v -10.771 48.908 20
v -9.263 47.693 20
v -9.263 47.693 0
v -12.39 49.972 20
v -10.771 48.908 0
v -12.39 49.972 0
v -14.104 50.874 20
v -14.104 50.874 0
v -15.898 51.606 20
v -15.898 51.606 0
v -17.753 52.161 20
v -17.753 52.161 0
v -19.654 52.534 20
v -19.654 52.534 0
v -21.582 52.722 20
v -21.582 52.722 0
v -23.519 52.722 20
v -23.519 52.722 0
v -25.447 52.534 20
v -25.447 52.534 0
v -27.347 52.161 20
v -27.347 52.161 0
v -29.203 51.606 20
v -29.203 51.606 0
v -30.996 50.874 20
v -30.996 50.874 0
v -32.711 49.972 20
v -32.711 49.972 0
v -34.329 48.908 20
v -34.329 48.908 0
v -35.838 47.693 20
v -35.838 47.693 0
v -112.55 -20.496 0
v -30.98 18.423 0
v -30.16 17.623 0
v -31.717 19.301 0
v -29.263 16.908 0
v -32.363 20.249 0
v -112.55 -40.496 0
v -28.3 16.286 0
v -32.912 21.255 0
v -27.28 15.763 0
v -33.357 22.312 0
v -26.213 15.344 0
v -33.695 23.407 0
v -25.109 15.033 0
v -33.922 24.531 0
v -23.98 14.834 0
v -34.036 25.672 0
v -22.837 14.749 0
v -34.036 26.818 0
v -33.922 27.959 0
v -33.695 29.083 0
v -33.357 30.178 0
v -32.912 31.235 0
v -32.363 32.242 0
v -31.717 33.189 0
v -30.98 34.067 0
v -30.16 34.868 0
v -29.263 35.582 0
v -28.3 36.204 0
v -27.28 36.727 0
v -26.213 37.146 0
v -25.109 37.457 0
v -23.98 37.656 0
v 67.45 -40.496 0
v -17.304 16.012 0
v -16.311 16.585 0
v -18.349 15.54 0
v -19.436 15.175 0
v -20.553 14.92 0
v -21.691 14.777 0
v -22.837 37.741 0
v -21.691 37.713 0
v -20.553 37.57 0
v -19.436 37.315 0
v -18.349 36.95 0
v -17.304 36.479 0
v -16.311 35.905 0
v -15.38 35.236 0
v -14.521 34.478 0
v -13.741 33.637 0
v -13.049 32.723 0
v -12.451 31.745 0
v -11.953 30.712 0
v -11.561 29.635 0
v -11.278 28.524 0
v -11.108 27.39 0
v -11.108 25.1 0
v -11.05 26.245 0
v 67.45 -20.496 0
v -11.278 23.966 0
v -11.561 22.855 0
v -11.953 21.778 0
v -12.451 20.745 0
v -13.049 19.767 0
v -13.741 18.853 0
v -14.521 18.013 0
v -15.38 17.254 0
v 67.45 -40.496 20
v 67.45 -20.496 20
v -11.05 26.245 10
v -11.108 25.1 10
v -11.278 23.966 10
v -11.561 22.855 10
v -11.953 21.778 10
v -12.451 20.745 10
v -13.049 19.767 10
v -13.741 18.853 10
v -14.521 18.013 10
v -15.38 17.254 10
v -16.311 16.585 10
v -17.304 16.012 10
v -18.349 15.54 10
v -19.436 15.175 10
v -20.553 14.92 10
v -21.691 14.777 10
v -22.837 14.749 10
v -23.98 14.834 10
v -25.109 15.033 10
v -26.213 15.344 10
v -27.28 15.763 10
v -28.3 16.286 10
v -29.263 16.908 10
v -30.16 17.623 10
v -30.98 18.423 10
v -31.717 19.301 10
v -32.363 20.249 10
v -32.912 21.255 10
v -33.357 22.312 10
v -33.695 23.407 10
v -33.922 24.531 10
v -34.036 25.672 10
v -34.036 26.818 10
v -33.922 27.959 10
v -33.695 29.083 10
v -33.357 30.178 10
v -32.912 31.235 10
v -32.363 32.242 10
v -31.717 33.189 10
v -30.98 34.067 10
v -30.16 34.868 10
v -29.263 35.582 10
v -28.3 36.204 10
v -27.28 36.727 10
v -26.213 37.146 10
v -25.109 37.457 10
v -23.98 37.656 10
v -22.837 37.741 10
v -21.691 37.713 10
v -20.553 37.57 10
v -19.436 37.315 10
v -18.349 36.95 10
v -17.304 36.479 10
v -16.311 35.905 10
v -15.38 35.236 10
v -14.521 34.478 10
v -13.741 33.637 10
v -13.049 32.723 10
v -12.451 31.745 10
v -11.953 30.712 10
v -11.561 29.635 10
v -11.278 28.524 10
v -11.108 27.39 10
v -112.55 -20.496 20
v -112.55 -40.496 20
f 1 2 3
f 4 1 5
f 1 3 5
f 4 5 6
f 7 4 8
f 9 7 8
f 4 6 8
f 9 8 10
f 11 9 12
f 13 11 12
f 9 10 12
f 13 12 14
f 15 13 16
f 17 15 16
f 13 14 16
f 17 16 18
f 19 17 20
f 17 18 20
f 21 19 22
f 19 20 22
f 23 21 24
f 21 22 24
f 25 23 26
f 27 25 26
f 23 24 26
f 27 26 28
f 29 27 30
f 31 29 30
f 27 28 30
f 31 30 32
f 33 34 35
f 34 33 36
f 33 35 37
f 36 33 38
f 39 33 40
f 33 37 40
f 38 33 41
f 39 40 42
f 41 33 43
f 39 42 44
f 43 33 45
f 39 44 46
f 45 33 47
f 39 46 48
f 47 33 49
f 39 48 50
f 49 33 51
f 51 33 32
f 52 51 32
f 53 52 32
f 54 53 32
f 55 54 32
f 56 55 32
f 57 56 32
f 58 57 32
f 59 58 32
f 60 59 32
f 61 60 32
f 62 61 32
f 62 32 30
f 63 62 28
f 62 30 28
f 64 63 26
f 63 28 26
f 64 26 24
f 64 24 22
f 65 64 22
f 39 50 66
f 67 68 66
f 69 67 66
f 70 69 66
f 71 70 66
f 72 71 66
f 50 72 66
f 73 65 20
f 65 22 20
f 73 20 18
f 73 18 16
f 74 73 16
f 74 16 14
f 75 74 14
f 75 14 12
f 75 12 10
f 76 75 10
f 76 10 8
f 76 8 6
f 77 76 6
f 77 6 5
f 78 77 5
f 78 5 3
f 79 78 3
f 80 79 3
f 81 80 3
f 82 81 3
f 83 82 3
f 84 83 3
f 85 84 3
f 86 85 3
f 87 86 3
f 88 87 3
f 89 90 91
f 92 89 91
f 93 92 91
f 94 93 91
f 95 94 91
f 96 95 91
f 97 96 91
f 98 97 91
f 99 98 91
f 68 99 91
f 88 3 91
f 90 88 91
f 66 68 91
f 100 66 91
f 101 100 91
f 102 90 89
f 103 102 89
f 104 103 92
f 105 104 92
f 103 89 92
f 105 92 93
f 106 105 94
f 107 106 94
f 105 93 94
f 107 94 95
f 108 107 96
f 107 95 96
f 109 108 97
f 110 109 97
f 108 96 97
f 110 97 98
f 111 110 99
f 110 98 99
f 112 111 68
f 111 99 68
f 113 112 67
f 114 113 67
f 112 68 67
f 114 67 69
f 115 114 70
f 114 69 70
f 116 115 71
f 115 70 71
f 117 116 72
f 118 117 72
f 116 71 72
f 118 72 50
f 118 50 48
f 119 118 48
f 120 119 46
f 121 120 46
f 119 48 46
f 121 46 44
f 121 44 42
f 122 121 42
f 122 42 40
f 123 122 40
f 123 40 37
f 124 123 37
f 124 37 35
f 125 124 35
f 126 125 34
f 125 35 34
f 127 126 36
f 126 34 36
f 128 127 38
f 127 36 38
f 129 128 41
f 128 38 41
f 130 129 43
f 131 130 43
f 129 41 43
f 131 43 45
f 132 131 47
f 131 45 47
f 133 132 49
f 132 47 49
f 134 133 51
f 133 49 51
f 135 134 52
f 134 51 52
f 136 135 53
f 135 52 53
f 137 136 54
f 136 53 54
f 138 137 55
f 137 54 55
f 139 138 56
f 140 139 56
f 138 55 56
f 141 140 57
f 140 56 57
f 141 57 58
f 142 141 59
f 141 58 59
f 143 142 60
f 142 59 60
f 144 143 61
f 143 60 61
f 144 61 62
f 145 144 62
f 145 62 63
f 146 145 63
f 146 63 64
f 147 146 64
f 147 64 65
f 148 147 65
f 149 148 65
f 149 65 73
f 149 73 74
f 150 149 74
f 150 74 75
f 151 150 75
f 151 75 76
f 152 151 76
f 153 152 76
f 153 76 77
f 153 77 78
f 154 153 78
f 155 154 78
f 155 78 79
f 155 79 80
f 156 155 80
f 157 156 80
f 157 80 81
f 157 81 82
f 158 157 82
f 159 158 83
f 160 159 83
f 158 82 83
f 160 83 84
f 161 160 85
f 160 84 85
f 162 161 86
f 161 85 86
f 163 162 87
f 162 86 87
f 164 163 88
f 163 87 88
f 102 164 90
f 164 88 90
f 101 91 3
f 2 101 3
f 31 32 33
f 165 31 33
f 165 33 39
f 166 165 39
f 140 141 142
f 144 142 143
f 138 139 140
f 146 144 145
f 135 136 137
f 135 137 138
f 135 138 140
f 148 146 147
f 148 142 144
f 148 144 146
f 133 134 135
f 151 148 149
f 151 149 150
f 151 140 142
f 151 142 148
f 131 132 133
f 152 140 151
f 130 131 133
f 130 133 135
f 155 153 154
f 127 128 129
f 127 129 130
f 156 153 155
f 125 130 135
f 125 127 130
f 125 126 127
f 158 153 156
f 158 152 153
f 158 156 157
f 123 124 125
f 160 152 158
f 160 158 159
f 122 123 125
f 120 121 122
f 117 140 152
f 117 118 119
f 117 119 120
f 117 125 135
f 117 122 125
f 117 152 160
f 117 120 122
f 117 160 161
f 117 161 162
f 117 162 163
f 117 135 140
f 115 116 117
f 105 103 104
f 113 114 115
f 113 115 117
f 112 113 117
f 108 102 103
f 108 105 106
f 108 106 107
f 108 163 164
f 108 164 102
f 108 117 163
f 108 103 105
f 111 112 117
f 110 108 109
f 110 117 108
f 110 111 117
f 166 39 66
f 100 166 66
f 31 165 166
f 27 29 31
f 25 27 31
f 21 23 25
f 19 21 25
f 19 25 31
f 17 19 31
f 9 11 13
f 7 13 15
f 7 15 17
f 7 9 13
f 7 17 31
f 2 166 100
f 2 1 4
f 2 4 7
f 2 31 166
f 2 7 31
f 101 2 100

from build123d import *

# Parameters (mm, degrees)
F1_DEPTH = 20
F2_R     = 11.5
F3_DEPTH = 10


with BuildPart() as f1:
    # F0 (on Top) → F1 (new body)
    with BuildSketch(Plane.XY):
        with BuildLine():
            Line((-35.837669, 47.693254), (-112.550392, -20.495833))
            Line((-112.550392, -20.495833), (-112.550392, -40.495833))
            Line((-112.550392, -40.495833), (67.449608, -40.495833))
            Line((67.449608, -40.495833), (67.449608, -20.495833))
            Line((67.449608, -20.495833), (-9.263115, 47.693254))
            ThreePointArc((-9.263115, 47.693254), (-22.550392, 52.745068), (-35.837669, 47.693254))
        make_face()
    extrude(amount=F1_DEPTH)

    # F2 (on face) → F3 (cut)
    with BuildSketch(Plane(origin=(0, 0, 0), x_dir=(1, 0, 0), z_dir=(0, 0, -1))):
        with Locations((-22.550392, -26.245068)):
            Circle(F2_R)
    extrude(amount=-F3_DEPTH, mode=Mode.SUBTRACT)


solid = f1.part
